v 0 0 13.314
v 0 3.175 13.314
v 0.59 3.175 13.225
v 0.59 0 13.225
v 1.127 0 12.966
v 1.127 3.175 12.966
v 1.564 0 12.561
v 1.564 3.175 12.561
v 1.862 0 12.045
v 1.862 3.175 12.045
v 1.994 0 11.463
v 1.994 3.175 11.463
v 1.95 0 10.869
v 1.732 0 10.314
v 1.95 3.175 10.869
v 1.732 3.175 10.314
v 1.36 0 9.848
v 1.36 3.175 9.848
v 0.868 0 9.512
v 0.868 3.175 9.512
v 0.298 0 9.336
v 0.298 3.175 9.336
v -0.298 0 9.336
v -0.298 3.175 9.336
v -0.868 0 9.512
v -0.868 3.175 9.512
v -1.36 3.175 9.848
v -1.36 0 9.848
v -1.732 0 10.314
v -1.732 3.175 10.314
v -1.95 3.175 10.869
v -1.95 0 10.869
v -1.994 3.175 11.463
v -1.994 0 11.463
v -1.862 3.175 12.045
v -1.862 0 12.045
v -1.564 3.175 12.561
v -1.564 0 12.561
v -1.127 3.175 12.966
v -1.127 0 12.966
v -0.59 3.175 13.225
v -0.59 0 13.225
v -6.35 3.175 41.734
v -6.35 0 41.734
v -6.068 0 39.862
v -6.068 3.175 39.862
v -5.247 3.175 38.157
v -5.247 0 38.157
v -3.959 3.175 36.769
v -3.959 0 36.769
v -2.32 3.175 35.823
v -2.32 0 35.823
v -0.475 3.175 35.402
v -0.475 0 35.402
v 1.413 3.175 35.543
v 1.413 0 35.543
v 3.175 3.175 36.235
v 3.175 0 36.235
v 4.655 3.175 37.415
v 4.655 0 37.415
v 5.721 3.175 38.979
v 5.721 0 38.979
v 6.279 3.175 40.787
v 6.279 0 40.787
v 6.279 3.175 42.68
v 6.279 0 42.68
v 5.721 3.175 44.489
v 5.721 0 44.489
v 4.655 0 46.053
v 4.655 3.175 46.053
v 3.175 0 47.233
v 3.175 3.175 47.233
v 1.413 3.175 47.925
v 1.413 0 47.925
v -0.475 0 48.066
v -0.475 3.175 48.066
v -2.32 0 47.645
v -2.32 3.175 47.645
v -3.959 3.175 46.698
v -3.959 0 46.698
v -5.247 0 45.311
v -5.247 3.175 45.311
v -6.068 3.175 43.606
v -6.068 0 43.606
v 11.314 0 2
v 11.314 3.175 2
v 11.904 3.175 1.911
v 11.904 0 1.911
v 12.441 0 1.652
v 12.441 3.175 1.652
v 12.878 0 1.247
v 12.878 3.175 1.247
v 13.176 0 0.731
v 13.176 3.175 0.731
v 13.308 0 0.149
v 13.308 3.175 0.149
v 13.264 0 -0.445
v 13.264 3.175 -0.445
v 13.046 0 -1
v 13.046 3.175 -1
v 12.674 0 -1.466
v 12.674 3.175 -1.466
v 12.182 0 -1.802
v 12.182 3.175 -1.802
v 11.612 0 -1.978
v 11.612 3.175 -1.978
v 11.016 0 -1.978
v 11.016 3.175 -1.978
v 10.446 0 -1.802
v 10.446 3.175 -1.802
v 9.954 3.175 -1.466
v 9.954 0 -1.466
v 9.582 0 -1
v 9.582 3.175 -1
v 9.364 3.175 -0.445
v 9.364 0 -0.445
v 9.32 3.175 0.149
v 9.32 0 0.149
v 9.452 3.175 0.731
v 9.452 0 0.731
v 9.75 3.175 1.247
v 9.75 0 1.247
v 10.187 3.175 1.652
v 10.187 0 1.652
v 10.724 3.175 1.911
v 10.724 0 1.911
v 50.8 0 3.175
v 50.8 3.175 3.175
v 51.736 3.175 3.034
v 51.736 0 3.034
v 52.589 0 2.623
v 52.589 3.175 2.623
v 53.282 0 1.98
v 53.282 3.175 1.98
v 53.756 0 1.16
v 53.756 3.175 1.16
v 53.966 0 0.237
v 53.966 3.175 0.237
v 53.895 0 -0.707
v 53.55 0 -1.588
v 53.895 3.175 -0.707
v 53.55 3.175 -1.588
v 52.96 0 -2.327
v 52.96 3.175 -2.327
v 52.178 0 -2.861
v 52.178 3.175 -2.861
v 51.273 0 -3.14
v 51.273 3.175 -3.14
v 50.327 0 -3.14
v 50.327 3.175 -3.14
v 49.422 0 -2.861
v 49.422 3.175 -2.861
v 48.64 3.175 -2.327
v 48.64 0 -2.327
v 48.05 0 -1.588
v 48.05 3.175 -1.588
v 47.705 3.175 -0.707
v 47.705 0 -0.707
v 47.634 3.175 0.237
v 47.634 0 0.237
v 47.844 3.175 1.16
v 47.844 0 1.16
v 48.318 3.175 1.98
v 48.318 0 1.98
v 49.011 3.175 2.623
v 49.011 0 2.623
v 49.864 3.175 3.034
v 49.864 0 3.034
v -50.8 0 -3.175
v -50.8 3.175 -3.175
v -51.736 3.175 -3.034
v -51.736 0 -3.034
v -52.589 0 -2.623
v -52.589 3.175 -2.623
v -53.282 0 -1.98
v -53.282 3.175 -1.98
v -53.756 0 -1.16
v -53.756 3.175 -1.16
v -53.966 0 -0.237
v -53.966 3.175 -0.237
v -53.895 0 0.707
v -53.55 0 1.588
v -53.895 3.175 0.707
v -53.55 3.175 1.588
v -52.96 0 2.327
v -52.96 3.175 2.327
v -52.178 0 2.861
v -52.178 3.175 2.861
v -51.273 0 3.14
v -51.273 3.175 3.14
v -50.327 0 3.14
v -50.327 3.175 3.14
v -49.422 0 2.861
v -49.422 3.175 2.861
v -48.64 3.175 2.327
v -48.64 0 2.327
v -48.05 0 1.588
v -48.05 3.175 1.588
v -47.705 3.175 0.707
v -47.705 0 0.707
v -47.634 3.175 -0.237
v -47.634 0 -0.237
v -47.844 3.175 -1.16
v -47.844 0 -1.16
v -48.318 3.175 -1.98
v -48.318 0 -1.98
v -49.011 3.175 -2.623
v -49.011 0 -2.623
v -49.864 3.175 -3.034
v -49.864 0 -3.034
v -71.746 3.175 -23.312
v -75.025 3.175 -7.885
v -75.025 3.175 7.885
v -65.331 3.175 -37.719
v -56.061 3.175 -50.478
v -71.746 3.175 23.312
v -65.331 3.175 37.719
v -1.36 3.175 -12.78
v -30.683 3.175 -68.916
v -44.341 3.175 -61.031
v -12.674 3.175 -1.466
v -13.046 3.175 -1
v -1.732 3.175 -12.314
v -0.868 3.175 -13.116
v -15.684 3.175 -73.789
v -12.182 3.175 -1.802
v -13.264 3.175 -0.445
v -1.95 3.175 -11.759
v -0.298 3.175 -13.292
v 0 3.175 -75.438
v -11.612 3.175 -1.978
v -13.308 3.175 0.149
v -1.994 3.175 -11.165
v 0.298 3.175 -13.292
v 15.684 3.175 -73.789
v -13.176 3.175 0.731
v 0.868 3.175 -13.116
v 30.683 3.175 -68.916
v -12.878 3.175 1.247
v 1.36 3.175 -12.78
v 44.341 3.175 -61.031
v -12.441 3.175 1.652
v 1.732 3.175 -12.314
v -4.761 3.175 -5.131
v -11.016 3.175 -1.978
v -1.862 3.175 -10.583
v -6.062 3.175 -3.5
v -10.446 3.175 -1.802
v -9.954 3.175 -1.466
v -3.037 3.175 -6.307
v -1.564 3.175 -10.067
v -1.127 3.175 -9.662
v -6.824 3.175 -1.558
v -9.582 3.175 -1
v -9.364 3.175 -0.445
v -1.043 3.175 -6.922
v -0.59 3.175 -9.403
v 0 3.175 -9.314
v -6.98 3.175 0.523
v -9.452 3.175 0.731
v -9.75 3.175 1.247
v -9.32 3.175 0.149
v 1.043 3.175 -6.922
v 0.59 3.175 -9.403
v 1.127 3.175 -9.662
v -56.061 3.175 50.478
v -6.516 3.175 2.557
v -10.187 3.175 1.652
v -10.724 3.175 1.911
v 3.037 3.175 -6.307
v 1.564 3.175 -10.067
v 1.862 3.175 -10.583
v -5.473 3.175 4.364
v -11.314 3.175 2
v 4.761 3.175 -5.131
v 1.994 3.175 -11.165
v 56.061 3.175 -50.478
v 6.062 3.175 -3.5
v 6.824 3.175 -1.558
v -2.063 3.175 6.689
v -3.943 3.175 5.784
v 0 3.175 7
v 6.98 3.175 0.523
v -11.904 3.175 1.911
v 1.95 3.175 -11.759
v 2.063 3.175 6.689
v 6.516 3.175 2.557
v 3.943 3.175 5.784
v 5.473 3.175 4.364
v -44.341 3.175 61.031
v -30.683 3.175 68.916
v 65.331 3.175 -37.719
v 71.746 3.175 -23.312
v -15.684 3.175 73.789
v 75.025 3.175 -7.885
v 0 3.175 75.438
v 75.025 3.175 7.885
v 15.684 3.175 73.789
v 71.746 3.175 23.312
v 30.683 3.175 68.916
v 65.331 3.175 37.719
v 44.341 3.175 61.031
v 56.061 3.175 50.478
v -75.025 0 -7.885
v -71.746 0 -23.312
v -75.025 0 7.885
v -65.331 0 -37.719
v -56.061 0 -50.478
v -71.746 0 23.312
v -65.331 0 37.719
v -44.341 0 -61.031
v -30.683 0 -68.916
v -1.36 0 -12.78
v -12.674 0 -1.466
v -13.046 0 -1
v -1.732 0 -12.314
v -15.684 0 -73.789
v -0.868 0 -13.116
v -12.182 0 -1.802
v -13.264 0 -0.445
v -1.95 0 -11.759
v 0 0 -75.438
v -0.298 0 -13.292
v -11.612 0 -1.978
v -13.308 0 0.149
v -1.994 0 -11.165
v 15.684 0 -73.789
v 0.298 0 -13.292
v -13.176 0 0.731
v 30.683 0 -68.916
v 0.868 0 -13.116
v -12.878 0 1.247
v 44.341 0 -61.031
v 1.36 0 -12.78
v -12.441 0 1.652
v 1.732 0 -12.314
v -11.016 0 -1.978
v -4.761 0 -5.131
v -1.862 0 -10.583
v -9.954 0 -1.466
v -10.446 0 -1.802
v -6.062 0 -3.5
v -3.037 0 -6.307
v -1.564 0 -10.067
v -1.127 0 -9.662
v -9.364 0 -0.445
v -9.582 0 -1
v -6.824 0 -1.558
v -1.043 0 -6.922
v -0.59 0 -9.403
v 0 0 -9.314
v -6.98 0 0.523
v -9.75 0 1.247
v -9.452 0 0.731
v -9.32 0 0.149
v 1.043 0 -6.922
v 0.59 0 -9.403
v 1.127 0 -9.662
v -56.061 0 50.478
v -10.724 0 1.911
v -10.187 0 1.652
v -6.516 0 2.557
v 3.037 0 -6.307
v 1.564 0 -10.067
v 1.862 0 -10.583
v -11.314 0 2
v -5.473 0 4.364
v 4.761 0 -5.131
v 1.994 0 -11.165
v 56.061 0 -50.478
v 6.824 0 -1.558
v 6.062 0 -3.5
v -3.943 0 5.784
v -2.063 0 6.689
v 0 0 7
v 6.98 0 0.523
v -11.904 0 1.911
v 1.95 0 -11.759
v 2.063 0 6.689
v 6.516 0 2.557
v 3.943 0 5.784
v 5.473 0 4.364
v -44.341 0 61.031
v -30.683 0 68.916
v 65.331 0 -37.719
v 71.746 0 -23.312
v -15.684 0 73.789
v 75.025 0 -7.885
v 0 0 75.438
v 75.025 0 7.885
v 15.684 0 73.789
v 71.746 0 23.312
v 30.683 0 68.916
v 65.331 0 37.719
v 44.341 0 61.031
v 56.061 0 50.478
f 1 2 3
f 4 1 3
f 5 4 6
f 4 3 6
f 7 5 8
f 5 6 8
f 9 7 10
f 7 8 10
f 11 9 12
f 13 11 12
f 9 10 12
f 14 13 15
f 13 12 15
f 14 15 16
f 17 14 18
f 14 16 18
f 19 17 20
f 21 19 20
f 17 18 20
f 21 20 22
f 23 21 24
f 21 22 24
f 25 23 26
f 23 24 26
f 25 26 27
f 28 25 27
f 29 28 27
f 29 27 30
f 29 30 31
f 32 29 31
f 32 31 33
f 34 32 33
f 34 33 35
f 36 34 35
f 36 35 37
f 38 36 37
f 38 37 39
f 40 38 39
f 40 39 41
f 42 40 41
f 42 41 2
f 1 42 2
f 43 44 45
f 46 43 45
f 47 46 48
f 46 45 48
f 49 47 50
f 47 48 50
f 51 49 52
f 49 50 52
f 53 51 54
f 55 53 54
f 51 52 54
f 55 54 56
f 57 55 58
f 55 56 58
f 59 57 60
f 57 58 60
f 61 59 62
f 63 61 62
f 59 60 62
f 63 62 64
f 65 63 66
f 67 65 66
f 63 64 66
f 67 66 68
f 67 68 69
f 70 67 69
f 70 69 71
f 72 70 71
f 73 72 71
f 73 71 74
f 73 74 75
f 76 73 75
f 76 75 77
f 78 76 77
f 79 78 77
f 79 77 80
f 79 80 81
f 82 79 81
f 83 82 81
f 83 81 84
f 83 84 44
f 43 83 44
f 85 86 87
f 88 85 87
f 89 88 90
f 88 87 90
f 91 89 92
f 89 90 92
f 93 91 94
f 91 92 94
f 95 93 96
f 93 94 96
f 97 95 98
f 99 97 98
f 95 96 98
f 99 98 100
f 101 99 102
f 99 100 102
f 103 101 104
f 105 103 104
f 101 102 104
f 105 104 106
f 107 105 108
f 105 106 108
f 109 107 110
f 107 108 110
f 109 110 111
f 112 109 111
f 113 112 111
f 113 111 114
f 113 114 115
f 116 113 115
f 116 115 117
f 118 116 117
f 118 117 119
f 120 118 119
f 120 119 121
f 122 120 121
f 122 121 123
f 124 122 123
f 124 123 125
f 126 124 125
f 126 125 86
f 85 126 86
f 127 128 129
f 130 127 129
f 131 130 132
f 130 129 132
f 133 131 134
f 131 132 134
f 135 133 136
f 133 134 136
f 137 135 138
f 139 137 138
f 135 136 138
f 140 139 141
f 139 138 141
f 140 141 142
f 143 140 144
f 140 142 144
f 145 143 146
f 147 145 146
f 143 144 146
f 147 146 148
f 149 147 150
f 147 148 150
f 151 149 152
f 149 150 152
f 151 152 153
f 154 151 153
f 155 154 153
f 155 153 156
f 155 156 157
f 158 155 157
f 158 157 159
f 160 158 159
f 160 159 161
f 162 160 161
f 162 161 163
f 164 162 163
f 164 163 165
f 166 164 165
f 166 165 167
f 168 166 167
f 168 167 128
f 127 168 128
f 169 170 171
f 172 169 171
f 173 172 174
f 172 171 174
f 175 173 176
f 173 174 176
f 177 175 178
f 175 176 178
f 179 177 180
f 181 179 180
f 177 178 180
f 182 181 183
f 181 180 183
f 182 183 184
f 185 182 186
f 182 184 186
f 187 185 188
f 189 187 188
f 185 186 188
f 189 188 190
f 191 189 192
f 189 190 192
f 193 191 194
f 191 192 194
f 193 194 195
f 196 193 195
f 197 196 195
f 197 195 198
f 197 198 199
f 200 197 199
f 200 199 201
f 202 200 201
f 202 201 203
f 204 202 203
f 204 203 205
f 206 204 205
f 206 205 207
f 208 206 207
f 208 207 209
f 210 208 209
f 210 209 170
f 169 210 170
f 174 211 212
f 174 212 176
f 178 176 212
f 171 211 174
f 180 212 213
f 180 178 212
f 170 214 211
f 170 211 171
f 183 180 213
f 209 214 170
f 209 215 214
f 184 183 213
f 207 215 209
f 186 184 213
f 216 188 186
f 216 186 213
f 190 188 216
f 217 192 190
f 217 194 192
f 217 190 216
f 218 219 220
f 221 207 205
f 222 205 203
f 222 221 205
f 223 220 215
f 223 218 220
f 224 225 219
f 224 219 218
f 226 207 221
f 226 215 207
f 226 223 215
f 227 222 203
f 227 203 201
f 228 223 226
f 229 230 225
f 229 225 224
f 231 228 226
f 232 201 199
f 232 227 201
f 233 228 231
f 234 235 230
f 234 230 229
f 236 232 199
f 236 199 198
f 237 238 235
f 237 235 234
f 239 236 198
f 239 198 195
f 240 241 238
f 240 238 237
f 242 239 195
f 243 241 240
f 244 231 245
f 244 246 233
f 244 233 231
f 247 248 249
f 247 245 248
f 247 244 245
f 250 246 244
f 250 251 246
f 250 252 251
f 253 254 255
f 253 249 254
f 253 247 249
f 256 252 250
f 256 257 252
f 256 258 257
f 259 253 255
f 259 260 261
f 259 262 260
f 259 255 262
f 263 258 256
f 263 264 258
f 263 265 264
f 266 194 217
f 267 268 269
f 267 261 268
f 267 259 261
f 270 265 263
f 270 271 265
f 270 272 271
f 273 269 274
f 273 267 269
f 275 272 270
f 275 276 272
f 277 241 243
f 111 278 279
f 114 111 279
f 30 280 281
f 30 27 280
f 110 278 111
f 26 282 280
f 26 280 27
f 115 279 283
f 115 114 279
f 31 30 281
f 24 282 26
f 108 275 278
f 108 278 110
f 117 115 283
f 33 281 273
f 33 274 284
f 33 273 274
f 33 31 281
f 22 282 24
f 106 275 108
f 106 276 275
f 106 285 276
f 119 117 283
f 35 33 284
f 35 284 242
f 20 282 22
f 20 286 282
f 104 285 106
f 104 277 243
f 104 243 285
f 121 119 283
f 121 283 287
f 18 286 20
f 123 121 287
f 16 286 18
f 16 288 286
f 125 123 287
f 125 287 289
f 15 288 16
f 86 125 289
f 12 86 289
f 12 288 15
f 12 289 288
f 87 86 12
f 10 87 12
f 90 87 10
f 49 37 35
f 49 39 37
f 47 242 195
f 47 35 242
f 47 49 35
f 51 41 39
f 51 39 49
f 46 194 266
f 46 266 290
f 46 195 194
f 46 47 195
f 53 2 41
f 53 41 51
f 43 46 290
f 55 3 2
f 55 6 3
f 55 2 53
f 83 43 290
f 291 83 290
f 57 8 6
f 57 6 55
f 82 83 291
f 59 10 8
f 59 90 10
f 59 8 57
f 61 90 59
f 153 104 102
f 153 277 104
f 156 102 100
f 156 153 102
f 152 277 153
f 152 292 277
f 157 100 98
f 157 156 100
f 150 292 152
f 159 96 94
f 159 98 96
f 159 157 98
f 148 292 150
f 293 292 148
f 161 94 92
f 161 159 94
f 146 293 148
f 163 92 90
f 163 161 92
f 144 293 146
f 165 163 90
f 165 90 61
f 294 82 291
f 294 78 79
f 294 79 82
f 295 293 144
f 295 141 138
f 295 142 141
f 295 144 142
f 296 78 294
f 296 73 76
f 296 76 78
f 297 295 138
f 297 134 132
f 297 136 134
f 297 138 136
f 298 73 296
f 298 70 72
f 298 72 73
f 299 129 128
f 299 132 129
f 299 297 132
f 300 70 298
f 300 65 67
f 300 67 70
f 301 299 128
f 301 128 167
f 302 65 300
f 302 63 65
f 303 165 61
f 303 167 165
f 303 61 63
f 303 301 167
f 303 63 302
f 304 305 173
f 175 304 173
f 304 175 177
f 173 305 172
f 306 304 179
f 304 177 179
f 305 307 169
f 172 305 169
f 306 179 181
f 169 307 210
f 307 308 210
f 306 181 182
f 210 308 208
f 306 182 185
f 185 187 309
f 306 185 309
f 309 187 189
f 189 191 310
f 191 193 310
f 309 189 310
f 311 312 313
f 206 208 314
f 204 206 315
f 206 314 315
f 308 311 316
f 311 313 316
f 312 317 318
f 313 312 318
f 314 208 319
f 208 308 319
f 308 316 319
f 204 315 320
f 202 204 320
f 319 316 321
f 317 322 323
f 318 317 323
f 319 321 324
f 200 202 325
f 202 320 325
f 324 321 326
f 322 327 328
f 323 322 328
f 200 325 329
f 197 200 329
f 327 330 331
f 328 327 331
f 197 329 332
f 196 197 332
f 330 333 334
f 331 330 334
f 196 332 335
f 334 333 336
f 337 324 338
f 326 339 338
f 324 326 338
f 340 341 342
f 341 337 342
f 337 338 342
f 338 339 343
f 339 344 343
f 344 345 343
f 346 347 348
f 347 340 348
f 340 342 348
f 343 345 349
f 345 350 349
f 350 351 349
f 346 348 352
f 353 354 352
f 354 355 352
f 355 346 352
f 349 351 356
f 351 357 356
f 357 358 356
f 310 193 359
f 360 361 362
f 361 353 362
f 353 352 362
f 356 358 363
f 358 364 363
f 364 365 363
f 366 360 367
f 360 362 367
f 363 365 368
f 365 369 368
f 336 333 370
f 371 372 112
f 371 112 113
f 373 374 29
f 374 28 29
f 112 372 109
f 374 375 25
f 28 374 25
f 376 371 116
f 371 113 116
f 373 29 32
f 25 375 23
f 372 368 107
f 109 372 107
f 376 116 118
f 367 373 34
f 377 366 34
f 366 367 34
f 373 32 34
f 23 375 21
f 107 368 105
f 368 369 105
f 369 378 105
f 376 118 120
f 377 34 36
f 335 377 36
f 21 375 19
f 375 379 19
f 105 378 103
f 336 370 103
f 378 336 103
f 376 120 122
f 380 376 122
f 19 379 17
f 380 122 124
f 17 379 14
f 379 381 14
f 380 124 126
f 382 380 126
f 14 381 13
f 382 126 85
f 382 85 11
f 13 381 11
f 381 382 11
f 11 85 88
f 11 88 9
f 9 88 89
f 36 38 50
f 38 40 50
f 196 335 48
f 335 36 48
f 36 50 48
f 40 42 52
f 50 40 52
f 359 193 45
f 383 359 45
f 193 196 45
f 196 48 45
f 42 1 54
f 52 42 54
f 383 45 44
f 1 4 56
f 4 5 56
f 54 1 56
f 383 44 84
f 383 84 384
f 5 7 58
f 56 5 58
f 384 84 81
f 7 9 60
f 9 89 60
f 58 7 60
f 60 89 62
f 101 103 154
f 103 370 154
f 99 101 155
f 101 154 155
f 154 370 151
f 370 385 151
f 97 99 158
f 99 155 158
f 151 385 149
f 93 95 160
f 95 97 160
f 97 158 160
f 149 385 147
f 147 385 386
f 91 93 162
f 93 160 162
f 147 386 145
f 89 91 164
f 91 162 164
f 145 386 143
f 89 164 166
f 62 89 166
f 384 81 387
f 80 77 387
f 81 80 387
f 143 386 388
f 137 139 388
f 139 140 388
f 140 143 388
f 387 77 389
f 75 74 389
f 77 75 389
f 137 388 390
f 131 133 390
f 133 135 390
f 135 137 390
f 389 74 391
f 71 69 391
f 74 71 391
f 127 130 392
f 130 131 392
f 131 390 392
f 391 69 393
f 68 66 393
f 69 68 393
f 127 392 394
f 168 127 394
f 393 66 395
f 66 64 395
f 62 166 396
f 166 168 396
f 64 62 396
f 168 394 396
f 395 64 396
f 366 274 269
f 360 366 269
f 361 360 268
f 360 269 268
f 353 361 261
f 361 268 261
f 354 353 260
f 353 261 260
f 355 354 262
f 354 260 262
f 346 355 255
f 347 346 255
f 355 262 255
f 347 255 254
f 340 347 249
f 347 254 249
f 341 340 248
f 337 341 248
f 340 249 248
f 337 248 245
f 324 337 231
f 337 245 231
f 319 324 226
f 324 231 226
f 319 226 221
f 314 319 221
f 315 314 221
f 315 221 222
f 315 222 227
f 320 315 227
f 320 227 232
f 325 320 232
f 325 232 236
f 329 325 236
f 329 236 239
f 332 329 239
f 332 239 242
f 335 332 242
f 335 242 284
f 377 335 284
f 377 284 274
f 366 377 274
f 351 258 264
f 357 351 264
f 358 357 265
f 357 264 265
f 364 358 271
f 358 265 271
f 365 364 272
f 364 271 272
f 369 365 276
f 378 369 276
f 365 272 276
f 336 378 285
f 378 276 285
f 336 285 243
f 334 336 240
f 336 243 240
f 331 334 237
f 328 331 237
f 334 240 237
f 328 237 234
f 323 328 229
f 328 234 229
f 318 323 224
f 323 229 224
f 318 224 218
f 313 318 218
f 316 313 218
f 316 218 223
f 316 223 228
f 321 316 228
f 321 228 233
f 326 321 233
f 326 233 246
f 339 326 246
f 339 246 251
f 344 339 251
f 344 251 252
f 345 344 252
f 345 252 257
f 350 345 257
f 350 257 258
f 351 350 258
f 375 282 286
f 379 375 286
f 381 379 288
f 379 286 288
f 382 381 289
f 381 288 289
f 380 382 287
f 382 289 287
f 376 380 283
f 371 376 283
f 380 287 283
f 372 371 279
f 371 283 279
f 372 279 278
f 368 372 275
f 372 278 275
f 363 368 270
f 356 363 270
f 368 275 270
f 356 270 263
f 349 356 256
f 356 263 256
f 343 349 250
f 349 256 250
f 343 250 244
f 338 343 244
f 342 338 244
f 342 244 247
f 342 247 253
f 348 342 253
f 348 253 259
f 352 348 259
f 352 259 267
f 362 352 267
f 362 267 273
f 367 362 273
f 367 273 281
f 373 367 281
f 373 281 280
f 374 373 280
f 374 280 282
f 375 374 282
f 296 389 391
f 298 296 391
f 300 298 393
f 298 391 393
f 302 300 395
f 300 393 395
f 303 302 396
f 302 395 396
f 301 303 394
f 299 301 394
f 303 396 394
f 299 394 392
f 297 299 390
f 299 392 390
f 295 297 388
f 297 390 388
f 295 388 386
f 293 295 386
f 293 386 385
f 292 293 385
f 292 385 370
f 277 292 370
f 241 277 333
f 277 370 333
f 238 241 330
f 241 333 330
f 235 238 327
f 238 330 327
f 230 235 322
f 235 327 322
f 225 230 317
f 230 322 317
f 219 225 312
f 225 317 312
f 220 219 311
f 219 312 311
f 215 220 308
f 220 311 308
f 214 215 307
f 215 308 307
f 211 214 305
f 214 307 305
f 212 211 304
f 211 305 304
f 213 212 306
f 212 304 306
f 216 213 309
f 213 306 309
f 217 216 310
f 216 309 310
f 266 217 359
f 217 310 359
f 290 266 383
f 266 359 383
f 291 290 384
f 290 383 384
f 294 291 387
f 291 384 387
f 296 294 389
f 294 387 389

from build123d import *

# Parameters (mm, degrees)
SKETCH1_R                  = 75.438
BOSS_EXTRUDE1_DEPTH        = 3.175
SKETCH2_R                  = 3.175
CUT_EXTRUDE1_DEPTH         = 107.732676875
SKETCH3_R                  = 7
SKETCH3_R_2                = 2
CUT_EXTRUDE2_DEPTH         = 107.732676875
F_1_2_0_5_DIAMETER_HOLE1_D = 12.7


with BuildPart() as part:
    # Sketch1 → Boss-Extrude1 (new body)
    with BuildSketch(Plane(origin=(0, 0, 0), x_dir=(1, 0, 0), z_dir=(0, 1, 0))):
        with Locations(Location((0, 0, 0), (0, 0, 270))):
            Circle(SKETCH1_R)
    extrude(amount=BOSS_EXTRUDE1_DEPTH)

    # Sketch2 → Cut-Extrude1 (cut, through all)
    with BuildSketch(Plane(origin=(0, 3.175, 0), x_dir=(1, 0, 0), z_dir=(0, 1, 0))):
        with Locations(Location((50.8, 0, 0), (0, 0, 270))):
            Circle(SKETCH2_R)
        with Locations(Location((-50.8, 0, 0), (0, 0, 90))):
            Circle(SKETCH2_R)
    extrude(amount=-CUT_EXTRUDE1_DEPTH, mode=Mode.SUBTRACT)

    # Sketch3 → Cut-Extrude2 (cut, through all)
    with BuildSketch(Plane(origin=(0, 3.175, 0), x_dir=(1, 0, 0), z_dir=(0, 1, 0))):
        with Locations(Location((0, 0, 0), (0, 0, 270))):
            Circle(SKETCH3_R)
        with Locations(Location((0, -11.314, 0), (0, 0, 270))):
            Circle(SKETCH3_R_2)
        with Locations(Location((-11.314, 0, 0), (0, 0, 270))):
            Circle(SKETCH3_R_2)
        with Locations(Location((11.314, 0, 0), (0, 0, 270))):
            Circle(SKETCH3_R_2)
        with Locations(Location((0, 11.314, 0), (0, 0, 270))):
            Circle(SKETCH3_R_2)
    extrude(amount=-CUT_EXTRUDE2_DEPTH, mode=Mode.SUBTRACT)

    # 1/2 (0.5) Diameter Hole1 (through all)
    with Locations(Plane(origin=(0, 3.175, 0), x_dir=(1, 0, 0), z_dir=(0, 1, 0))):
        with Locations((0, -41.73382544)):
            Hole(F_1_2_0_5_DIAMETER_HOLE1_D / 2)


solid = part.part
